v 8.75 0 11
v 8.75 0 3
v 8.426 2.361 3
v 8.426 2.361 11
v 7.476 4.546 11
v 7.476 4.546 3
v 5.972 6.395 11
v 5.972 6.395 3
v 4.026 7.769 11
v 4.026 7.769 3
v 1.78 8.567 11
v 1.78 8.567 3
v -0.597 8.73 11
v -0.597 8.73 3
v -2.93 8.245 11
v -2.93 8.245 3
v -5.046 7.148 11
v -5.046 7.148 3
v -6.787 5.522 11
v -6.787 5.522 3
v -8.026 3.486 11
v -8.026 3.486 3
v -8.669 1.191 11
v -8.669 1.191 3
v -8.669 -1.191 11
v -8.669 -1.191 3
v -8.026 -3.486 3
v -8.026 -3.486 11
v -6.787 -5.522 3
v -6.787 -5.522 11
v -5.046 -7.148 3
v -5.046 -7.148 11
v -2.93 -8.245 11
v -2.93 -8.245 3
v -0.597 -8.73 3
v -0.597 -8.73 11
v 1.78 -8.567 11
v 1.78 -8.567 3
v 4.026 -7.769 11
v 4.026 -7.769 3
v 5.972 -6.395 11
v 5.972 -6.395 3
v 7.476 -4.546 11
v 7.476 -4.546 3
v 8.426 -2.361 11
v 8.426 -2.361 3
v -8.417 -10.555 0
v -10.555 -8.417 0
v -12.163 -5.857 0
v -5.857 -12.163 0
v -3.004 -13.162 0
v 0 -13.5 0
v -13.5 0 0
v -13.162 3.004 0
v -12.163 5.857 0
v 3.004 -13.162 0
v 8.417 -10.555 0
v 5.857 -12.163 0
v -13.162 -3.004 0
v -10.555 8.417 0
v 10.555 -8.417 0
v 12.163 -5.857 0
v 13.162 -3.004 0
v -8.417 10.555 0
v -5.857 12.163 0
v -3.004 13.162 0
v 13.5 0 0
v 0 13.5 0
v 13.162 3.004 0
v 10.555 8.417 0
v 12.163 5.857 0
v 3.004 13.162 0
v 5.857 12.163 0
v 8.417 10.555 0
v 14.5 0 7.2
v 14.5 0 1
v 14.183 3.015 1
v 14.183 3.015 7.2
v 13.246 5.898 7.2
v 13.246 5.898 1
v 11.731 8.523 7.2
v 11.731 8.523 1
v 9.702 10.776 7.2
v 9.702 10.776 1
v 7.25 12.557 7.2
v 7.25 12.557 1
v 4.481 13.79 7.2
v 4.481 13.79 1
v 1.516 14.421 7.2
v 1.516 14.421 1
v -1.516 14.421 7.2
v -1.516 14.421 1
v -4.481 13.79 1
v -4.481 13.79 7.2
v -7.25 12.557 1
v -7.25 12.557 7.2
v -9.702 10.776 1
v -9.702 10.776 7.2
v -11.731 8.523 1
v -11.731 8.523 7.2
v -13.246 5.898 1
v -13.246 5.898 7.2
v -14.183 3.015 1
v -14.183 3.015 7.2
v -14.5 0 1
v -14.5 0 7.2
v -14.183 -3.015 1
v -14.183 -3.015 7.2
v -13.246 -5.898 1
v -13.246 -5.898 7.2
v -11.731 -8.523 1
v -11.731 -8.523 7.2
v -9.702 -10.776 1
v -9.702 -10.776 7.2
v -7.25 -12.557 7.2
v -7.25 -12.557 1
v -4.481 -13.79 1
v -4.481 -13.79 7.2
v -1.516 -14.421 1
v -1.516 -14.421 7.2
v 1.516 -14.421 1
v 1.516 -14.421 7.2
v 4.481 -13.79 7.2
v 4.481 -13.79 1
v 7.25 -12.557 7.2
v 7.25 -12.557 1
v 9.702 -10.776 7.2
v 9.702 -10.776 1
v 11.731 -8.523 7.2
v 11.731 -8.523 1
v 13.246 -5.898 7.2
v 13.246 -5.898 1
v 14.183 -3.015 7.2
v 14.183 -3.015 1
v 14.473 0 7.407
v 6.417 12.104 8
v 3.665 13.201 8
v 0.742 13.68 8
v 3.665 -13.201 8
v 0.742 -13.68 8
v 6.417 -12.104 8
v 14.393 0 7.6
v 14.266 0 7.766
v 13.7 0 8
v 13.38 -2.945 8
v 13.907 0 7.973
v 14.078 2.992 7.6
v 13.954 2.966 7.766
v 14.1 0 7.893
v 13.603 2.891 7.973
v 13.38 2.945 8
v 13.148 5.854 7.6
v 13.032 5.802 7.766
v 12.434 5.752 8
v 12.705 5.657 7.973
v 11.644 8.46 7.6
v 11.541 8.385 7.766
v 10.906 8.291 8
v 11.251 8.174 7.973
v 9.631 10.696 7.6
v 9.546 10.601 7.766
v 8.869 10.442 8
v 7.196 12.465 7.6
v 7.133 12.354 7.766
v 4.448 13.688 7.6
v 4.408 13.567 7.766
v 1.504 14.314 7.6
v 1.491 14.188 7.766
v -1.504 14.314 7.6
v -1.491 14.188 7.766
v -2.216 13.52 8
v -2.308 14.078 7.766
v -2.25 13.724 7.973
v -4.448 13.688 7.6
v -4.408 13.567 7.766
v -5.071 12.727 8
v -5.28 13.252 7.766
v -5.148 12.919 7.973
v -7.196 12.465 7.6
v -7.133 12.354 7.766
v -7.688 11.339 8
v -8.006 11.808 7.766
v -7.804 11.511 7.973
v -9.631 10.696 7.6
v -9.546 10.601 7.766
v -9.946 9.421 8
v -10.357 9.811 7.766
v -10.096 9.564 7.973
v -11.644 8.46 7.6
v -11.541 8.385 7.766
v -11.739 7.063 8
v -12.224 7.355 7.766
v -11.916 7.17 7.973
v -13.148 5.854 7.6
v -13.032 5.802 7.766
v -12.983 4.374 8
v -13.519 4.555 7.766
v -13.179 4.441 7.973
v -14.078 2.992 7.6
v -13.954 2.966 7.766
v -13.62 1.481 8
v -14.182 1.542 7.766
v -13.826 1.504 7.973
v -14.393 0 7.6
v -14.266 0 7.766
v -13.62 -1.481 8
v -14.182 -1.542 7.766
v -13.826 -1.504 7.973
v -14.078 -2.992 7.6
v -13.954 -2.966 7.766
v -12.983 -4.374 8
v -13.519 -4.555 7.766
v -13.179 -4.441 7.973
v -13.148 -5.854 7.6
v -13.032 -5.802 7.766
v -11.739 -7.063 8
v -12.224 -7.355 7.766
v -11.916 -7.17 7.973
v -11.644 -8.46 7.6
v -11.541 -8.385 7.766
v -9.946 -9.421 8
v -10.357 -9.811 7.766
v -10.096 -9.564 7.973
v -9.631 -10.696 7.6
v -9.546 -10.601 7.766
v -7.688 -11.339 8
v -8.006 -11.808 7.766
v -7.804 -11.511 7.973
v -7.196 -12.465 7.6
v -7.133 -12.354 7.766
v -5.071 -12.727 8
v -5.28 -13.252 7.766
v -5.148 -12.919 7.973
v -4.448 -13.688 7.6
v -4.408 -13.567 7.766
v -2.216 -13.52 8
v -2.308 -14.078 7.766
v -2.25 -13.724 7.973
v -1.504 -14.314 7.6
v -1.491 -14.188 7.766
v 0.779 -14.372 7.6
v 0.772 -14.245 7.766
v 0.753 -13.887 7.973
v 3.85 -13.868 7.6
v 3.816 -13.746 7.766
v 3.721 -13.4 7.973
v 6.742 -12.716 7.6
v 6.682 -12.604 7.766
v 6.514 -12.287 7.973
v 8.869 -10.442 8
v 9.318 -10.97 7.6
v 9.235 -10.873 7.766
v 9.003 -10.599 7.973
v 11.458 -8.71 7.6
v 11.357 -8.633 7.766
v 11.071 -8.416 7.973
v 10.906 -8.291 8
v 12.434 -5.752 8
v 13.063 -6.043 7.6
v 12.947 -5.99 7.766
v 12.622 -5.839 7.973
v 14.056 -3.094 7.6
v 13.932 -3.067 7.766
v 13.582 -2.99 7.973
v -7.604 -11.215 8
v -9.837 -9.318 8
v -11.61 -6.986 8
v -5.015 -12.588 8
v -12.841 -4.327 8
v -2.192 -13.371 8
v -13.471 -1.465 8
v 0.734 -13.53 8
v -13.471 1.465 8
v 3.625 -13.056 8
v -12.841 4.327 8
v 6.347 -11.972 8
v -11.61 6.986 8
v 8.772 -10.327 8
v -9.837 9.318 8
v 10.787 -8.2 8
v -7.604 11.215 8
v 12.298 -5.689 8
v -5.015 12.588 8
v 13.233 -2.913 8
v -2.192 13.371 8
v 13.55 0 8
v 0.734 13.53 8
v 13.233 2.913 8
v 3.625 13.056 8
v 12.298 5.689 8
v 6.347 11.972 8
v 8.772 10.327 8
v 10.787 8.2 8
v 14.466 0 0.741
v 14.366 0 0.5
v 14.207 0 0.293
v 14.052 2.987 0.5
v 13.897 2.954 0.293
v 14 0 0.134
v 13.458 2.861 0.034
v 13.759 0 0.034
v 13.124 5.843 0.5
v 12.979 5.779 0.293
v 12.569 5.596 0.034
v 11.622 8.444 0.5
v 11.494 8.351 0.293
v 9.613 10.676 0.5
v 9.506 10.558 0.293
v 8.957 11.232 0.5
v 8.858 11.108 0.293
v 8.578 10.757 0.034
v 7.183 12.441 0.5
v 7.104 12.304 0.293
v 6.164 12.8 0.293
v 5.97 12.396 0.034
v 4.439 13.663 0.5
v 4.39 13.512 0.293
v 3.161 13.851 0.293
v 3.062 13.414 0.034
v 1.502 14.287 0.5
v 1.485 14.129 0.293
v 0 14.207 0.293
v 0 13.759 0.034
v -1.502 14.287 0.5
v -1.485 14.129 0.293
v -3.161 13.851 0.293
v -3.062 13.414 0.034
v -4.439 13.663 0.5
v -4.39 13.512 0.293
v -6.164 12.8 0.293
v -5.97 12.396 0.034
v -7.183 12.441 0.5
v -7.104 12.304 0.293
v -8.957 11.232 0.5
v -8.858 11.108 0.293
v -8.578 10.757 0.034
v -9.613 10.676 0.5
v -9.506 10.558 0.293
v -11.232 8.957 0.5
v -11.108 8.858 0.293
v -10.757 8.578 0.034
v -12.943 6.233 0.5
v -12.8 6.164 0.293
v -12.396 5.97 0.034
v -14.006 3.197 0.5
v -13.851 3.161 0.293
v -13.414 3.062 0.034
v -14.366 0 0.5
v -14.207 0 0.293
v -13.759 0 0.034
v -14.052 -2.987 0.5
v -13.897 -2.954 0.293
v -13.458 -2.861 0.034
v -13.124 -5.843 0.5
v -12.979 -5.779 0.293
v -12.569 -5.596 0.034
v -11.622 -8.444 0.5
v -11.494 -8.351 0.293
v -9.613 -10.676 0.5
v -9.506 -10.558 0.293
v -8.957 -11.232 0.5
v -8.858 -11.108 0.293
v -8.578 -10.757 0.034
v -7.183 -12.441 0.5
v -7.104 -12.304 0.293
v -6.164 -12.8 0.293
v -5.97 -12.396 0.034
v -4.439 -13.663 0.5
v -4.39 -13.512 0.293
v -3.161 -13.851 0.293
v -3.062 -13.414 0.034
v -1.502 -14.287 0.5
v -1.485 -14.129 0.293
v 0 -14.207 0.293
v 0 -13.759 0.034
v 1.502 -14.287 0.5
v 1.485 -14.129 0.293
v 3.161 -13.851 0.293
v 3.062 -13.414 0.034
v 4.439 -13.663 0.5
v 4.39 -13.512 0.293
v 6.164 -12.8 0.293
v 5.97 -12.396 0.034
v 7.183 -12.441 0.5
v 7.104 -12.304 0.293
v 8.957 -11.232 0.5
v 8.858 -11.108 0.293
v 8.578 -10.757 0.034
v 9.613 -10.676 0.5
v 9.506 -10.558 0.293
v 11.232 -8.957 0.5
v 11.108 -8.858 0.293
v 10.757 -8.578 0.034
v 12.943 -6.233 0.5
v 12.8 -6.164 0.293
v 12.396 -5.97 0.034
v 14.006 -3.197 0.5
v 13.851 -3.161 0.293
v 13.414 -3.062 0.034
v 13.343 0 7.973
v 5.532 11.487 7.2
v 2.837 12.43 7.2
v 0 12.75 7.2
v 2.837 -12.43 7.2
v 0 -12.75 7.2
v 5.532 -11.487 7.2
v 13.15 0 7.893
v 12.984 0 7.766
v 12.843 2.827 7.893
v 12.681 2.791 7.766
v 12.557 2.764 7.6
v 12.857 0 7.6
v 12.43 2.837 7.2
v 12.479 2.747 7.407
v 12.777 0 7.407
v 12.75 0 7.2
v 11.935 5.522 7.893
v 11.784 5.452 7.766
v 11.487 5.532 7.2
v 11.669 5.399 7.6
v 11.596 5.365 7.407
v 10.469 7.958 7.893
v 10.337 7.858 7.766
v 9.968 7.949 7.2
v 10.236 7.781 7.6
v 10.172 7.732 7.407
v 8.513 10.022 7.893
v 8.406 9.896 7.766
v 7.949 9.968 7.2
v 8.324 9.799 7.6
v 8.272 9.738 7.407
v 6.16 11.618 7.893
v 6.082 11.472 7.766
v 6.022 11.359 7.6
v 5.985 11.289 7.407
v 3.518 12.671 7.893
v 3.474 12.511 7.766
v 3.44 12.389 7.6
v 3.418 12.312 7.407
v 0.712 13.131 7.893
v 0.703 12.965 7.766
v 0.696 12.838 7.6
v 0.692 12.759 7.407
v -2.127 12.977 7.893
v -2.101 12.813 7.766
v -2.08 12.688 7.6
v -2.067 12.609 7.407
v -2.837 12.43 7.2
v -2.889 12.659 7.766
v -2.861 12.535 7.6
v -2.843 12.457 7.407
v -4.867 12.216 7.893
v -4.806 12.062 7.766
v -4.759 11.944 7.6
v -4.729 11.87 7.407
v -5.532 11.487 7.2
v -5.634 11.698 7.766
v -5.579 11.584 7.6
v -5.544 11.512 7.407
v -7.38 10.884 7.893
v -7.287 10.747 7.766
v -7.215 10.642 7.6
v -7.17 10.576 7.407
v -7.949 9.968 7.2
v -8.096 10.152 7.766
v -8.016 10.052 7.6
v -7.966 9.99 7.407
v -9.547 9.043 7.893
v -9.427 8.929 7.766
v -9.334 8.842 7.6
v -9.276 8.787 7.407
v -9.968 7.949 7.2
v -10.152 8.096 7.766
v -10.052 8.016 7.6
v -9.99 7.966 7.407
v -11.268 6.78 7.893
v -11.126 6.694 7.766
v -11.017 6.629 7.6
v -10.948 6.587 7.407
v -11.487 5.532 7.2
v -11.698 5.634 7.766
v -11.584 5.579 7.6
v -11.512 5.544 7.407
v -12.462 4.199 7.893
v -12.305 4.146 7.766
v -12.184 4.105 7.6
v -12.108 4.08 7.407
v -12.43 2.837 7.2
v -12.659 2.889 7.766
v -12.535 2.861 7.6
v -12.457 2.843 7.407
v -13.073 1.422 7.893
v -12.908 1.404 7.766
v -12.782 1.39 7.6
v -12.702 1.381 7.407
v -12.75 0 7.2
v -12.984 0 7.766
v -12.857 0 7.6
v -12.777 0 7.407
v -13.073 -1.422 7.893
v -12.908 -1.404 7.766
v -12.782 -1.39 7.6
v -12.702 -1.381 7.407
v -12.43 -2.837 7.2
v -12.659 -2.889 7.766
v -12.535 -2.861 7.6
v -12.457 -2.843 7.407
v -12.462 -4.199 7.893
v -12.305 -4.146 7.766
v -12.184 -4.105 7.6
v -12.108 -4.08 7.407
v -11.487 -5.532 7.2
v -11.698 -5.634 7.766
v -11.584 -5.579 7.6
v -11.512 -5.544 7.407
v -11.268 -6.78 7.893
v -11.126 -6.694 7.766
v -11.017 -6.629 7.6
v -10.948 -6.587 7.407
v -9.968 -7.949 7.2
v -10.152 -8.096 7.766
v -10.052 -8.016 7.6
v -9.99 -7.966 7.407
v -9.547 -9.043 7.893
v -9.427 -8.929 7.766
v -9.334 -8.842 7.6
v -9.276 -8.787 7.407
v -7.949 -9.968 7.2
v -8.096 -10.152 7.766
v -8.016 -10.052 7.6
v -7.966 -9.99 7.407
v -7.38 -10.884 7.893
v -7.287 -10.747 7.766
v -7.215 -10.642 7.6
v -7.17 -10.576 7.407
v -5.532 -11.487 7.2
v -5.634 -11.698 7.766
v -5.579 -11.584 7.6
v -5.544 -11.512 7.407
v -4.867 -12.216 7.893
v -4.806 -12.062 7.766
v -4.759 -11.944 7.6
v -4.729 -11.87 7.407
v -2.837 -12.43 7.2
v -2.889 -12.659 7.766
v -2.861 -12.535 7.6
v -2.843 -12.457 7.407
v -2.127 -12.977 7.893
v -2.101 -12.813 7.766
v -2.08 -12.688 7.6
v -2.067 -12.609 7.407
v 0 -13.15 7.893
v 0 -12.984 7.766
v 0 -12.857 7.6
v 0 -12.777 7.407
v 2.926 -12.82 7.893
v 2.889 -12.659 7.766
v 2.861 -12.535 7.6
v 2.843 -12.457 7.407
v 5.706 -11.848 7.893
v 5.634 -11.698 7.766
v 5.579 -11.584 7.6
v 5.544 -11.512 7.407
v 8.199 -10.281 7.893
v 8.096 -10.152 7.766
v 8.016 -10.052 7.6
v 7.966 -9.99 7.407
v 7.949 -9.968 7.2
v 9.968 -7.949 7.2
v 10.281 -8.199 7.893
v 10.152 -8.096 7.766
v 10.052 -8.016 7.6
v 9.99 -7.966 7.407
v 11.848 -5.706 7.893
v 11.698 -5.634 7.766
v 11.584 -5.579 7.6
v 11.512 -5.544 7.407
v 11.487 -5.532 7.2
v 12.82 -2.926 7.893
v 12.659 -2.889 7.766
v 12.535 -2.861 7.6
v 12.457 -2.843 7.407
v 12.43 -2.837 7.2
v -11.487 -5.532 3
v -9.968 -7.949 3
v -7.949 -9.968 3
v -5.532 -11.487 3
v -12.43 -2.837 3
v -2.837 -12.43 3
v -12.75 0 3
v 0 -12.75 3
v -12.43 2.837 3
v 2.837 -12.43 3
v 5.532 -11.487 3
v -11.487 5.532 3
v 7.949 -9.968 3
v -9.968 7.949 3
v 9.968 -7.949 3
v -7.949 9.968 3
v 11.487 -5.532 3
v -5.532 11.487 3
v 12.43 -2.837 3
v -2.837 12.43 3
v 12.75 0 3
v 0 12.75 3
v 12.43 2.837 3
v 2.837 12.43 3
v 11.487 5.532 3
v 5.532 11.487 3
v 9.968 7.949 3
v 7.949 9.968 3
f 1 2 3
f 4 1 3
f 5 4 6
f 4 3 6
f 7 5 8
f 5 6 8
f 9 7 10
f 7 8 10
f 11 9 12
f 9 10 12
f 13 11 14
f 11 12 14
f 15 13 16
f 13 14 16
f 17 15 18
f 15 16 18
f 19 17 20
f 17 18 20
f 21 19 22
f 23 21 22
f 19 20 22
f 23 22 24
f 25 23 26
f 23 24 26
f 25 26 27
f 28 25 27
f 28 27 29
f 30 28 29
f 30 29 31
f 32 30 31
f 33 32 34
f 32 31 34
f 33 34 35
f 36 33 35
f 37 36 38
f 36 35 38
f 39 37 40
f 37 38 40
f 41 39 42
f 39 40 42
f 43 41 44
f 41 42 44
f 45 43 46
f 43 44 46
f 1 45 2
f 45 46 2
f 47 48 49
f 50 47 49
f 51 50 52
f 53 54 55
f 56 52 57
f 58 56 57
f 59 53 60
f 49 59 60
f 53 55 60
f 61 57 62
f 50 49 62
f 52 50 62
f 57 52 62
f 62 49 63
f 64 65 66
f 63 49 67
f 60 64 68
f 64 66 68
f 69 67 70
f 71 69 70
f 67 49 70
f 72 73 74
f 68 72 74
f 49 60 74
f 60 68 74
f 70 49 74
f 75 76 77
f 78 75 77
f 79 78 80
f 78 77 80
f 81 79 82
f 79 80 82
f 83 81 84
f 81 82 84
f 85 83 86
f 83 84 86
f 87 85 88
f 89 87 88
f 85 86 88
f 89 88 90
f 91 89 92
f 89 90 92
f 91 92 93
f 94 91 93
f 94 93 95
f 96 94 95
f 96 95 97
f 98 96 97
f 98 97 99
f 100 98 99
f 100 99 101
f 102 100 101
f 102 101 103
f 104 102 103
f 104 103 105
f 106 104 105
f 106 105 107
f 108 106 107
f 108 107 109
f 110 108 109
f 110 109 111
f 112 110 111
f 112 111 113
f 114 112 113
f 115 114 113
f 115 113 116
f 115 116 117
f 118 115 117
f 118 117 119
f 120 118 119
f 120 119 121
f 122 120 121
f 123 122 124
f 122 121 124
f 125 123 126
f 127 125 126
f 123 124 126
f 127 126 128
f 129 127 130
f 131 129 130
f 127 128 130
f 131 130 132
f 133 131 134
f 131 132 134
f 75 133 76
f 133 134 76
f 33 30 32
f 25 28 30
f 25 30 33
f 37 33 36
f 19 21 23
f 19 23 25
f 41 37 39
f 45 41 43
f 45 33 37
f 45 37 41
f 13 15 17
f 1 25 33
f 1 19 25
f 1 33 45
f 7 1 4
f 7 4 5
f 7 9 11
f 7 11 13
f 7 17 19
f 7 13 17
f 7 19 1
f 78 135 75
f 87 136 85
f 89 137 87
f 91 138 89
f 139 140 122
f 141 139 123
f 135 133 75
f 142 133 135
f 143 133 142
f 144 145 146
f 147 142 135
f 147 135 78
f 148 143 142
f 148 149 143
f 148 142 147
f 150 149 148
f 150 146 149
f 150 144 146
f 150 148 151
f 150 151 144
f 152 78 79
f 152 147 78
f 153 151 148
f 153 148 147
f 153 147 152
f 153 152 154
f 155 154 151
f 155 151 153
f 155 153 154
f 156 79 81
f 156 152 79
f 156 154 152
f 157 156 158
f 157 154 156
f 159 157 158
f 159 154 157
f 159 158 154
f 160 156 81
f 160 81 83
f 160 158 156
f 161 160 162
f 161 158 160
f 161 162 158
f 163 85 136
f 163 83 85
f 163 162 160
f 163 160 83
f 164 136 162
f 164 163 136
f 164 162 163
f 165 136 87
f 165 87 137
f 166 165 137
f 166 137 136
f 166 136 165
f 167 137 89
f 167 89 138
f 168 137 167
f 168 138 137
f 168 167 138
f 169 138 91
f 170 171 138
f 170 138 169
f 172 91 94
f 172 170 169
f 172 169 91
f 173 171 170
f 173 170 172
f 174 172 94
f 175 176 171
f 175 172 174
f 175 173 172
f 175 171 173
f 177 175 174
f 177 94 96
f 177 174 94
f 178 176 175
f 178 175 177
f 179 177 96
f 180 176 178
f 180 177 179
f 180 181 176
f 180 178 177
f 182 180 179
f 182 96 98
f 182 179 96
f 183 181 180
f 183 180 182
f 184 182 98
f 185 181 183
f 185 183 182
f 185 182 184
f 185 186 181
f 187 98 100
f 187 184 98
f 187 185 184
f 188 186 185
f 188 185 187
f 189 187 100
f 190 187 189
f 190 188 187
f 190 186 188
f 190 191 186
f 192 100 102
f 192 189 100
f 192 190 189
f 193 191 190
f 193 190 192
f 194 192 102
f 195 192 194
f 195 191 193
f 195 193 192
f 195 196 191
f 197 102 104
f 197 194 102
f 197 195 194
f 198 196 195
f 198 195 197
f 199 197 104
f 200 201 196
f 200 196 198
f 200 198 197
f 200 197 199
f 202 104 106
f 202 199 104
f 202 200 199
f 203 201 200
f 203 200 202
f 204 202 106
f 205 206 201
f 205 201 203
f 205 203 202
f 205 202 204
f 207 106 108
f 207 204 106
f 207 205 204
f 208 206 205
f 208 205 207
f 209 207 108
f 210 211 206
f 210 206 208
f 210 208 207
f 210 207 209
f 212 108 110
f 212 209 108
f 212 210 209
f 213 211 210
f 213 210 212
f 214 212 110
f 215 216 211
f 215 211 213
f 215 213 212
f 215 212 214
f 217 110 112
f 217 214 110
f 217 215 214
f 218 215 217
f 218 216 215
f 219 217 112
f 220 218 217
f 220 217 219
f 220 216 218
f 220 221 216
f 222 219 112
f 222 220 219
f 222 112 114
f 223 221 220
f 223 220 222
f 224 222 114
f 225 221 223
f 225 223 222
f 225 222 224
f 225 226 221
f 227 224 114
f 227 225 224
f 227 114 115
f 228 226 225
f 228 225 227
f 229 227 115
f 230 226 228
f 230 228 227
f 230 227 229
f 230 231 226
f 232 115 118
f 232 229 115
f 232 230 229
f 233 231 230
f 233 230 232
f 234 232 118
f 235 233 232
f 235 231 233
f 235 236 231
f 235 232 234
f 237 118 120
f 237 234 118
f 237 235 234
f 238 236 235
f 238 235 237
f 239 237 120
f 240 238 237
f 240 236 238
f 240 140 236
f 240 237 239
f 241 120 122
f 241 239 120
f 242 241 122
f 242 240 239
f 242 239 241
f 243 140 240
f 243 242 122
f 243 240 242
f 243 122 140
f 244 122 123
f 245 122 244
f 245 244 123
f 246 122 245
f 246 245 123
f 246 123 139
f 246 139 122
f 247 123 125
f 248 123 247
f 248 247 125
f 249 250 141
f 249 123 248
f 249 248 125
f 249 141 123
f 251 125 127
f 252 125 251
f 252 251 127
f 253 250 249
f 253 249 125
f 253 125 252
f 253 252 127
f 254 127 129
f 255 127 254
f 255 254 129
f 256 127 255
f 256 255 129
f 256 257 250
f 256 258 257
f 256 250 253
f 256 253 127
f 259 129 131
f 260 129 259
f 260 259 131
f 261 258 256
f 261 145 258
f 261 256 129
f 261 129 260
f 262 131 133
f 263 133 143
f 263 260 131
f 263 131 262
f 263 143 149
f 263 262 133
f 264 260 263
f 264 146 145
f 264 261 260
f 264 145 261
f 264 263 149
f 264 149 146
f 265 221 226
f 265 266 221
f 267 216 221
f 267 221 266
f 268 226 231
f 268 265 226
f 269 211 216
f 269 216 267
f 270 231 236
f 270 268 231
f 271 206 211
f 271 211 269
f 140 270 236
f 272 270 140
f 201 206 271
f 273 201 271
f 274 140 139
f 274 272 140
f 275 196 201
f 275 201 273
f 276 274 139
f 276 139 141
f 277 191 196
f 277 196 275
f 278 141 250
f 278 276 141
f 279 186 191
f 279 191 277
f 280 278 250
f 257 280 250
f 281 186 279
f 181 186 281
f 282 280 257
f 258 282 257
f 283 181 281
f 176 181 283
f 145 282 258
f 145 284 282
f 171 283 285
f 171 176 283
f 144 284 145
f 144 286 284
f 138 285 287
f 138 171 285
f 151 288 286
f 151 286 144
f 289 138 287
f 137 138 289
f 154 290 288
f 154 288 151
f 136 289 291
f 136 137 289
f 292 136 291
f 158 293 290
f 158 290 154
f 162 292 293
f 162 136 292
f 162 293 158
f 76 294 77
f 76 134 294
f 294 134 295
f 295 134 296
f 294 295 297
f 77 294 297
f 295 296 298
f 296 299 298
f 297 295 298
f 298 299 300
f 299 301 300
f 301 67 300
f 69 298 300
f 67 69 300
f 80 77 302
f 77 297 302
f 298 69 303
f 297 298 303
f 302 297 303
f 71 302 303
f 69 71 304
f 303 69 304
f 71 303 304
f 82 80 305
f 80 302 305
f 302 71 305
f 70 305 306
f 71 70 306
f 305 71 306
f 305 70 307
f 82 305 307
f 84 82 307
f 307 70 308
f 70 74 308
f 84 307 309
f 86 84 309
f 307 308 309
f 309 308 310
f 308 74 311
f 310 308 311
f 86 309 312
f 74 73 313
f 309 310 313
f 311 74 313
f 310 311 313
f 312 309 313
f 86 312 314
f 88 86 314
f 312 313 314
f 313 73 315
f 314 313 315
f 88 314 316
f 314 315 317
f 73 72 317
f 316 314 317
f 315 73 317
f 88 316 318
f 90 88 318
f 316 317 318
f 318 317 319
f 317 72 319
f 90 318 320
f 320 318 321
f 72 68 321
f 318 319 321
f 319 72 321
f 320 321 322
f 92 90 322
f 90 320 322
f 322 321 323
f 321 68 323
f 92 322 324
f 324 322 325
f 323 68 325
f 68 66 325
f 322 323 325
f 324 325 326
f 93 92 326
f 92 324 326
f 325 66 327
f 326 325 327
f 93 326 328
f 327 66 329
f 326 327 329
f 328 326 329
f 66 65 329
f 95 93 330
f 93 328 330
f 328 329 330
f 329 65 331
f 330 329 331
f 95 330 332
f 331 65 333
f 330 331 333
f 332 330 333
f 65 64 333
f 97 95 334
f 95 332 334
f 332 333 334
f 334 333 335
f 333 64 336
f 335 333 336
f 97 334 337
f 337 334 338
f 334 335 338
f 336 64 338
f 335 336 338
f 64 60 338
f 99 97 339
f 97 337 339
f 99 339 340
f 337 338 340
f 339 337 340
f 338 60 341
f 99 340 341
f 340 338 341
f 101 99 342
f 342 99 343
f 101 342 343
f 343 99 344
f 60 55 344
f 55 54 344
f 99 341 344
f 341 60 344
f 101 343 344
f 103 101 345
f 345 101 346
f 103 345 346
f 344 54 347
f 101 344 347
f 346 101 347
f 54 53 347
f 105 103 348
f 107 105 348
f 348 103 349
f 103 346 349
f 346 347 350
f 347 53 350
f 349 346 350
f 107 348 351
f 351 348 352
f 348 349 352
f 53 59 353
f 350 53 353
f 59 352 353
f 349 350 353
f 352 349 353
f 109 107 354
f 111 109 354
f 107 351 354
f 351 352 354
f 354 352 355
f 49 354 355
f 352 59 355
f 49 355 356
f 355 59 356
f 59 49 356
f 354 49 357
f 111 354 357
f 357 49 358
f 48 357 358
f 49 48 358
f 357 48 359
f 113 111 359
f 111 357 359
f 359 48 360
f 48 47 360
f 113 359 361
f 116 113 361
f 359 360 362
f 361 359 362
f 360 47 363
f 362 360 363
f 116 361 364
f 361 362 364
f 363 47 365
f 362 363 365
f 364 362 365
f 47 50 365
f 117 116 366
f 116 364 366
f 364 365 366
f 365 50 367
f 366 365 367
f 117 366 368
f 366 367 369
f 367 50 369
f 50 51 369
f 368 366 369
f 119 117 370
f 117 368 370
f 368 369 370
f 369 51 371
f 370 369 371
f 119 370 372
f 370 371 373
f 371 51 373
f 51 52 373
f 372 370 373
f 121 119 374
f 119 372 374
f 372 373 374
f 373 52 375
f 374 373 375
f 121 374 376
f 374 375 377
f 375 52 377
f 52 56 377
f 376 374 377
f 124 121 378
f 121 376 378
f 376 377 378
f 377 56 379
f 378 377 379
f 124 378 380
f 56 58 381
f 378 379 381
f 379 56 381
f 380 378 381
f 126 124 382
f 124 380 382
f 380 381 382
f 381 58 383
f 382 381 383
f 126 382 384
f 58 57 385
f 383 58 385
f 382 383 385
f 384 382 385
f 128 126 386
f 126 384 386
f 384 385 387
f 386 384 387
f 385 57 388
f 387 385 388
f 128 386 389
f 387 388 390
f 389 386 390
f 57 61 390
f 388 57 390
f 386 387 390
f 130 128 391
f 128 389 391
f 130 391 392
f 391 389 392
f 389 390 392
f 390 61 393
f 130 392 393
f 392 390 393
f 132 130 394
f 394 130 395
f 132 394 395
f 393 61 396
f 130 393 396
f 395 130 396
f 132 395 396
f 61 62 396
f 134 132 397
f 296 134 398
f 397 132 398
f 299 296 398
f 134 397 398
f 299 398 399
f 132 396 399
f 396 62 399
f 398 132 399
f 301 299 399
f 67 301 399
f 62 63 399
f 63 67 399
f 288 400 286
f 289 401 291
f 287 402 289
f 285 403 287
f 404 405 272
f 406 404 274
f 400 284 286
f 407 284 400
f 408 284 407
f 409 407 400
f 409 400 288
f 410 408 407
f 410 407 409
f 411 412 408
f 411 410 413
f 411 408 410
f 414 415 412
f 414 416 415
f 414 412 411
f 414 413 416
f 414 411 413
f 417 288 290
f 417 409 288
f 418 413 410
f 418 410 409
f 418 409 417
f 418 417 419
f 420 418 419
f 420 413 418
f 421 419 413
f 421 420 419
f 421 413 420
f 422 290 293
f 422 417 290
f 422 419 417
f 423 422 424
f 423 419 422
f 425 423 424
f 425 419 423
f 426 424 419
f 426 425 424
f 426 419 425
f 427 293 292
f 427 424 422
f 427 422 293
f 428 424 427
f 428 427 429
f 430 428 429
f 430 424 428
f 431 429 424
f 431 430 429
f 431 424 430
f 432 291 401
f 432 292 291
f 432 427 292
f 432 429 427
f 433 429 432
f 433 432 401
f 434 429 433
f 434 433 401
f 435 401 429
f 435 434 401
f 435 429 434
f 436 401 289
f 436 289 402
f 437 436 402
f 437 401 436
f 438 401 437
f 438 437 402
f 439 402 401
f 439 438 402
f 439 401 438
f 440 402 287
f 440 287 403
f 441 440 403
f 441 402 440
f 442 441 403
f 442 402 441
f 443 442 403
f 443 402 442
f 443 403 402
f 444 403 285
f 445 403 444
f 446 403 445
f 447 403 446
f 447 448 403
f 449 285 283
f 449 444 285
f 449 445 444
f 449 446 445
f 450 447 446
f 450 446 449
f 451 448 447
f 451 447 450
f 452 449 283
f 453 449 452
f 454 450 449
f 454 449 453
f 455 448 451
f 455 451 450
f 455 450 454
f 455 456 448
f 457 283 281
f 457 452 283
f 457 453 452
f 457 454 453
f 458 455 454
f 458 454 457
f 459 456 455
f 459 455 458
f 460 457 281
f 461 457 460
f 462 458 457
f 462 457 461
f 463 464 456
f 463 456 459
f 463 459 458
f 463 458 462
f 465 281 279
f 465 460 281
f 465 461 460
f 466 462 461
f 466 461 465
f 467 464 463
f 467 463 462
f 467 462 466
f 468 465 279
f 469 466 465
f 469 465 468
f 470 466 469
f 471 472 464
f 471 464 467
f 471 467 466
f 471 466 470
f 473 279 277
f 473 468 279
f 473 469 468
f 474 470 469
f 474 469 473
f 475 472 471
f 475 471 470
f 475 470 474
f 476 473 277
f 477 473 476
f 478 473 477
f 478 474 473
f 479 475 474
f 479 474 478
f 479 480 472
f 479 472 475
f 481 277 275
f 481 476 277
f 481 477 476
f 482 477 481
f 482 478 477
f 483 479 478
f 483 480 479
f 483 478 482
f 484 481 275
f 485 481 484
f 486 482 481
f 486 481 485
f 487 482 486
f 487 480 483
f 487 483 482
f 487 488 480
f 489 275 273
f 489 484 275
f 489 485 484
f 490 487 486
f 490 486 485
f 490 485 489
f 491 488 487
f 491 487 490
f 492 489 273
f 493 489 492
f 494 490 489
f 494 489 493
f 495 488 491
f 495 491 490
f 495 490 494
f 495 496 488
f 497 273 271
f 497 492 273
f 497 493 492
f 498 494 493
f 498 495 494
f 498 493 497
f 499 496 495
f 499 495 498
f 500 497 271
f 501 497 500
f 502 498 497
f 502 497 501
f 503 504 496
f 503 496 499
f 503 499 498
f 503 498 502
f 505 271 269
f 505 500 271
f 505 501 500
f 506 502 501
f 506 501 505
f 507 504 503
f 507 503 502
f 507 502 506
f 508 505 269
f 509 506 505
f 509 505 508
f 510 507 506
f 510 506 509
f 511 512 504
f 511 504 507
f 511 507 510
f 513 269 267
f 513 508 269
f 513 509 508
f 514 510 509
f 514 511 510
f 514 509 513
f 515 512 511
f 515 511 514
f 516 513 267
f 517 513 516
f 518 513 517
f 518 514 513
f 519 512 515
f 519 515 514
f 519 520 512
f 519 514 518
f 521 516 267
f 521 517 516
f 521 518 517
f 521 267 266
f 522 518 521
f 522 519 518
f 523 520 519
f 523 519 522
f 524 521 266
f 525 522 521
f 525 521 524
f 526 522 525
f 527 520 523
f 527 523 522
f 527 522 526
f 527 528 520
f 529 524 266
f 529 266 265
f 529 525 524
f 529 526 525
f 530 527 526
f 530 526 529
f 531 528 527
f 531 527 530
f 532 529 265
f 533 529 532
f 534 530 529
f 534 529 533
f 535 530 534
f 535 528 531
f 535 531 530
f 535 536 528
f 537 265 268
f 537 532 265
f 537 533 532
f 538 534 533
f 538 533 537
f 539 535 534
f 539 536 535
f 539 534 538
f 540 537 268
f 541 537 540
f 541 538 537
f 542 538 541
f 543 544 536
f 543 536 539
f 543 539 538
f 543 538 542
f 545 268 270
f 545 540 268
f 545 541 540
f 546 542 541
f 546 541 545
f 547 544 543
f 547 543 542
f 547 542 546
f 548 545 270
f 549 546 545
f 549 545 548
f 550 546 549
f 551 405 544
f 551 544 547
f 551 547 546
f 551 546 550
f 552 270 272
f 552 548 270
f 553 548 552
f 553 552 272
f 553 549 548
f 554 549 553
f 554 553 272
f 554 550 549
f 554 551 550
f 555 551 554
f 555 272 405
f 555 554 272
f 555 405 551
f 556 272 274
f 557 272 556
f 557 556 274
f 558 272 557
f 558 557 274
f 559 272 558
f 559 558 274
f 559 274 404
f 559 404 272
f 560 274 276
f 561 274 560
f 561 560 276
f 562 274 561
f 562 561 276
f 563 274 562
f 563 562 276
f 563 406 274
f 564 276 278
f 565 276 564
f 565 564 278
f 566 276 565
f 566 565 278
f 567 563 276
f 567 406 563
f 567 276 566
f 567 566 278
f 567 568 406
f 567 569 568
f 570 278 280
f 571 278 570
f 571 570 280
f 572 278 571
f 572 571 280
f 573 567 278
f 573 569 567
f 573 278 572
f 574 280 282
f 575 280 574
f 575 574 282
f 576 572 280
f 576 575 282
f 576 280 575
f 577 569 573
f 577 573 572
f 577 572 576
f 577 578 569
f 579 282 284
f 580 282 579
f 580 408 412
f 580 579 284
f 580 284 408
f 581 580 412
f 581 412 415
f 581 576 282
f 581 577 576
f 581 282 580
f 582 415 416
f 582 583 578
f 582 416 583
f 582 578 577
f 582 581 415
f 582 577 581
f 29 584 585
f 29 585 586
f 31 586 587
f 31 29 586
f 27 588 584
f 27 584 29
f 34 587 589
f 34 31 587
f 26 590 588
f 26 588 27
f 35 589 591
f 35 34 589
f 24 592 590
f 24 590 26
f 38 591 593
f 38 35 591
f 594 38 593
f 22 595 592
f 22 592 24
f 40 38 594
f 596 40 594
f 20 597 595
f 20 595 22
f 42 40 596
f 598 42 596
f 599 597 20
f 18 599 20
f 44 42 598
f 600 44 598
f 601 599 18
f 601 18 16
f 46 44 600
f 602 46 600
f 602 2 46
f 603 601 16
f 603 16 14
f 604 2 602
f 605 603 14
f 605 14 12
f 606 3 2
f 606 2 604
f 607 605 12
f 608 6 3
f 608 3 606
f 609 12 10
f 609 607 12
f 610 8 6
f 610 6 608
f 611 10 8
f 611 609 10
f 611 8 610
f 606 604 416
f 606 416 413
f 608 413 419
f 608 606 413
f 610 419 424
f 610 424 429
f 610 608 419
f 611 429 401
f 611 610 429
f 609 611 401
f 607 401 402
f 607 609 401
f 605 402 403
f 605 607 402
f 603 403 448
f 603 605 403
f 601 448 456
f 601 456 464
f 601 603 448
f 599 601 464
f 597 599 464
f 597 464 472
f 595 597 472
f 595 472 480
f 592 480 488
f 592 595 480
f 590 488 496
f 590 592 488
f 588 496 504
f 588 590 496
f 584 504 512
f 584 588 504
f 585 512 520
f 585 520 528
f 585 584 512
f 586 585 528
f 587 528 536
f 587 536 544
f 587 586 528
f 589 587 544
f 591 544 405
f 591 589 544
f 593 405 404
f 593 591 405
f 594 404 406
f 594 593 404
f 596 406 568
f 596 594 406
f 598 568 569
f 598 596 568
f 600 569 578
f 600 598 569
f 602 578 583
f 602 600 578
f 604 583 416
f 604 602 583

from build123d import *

# Parameters (mm, degrees)
F0_R     = 14.5
F1_DEPTH = 3
F2_R     = 8.75
F3_DEPTH = 8
F4_R     = 1
F5_R     = 14.5
F5_R_2   = 12.75
F6_DEPTH = 5
F7_R     = 0.8


with BuildPart() as f1:
    # F0 (on Top) → F1 (new body)
    with BuildSketch(Plane.XY):
        Circle(F0_R)
    extrude(amount=F1_DEPTH)

    # F2 (on face) → F3 (join)
    with BuildSketch(Plane.XY.offset(3)):
        Circle(F2_R)
    extrude(amount=F3_DEPTH)

    # F4
    f4_edges = [f1.edges().sort_by_distance(p)[0] for p in [
        (-14.5, 0, 0),
    ]]
    fillet(f4_edges, radius=F4_R)

    # F5 (on face) → F6 (join)
    with BuildSketch(Plane.XY.offset(3)):
        Circle(F5_R)
        Circle(F5_R_2, mode=Mode.SUBTRACT)
    extrude(amount=F6_DEPTH)

    # F7
    f7_edges = [f1.edges().sort_by_distance(p)[0] for p in [
        (-14.5, 0, 8),
        (-12.75, 0, 8),
    ]]
    fillet(f7_edges, radius=F7_R)


solid = f1.part
